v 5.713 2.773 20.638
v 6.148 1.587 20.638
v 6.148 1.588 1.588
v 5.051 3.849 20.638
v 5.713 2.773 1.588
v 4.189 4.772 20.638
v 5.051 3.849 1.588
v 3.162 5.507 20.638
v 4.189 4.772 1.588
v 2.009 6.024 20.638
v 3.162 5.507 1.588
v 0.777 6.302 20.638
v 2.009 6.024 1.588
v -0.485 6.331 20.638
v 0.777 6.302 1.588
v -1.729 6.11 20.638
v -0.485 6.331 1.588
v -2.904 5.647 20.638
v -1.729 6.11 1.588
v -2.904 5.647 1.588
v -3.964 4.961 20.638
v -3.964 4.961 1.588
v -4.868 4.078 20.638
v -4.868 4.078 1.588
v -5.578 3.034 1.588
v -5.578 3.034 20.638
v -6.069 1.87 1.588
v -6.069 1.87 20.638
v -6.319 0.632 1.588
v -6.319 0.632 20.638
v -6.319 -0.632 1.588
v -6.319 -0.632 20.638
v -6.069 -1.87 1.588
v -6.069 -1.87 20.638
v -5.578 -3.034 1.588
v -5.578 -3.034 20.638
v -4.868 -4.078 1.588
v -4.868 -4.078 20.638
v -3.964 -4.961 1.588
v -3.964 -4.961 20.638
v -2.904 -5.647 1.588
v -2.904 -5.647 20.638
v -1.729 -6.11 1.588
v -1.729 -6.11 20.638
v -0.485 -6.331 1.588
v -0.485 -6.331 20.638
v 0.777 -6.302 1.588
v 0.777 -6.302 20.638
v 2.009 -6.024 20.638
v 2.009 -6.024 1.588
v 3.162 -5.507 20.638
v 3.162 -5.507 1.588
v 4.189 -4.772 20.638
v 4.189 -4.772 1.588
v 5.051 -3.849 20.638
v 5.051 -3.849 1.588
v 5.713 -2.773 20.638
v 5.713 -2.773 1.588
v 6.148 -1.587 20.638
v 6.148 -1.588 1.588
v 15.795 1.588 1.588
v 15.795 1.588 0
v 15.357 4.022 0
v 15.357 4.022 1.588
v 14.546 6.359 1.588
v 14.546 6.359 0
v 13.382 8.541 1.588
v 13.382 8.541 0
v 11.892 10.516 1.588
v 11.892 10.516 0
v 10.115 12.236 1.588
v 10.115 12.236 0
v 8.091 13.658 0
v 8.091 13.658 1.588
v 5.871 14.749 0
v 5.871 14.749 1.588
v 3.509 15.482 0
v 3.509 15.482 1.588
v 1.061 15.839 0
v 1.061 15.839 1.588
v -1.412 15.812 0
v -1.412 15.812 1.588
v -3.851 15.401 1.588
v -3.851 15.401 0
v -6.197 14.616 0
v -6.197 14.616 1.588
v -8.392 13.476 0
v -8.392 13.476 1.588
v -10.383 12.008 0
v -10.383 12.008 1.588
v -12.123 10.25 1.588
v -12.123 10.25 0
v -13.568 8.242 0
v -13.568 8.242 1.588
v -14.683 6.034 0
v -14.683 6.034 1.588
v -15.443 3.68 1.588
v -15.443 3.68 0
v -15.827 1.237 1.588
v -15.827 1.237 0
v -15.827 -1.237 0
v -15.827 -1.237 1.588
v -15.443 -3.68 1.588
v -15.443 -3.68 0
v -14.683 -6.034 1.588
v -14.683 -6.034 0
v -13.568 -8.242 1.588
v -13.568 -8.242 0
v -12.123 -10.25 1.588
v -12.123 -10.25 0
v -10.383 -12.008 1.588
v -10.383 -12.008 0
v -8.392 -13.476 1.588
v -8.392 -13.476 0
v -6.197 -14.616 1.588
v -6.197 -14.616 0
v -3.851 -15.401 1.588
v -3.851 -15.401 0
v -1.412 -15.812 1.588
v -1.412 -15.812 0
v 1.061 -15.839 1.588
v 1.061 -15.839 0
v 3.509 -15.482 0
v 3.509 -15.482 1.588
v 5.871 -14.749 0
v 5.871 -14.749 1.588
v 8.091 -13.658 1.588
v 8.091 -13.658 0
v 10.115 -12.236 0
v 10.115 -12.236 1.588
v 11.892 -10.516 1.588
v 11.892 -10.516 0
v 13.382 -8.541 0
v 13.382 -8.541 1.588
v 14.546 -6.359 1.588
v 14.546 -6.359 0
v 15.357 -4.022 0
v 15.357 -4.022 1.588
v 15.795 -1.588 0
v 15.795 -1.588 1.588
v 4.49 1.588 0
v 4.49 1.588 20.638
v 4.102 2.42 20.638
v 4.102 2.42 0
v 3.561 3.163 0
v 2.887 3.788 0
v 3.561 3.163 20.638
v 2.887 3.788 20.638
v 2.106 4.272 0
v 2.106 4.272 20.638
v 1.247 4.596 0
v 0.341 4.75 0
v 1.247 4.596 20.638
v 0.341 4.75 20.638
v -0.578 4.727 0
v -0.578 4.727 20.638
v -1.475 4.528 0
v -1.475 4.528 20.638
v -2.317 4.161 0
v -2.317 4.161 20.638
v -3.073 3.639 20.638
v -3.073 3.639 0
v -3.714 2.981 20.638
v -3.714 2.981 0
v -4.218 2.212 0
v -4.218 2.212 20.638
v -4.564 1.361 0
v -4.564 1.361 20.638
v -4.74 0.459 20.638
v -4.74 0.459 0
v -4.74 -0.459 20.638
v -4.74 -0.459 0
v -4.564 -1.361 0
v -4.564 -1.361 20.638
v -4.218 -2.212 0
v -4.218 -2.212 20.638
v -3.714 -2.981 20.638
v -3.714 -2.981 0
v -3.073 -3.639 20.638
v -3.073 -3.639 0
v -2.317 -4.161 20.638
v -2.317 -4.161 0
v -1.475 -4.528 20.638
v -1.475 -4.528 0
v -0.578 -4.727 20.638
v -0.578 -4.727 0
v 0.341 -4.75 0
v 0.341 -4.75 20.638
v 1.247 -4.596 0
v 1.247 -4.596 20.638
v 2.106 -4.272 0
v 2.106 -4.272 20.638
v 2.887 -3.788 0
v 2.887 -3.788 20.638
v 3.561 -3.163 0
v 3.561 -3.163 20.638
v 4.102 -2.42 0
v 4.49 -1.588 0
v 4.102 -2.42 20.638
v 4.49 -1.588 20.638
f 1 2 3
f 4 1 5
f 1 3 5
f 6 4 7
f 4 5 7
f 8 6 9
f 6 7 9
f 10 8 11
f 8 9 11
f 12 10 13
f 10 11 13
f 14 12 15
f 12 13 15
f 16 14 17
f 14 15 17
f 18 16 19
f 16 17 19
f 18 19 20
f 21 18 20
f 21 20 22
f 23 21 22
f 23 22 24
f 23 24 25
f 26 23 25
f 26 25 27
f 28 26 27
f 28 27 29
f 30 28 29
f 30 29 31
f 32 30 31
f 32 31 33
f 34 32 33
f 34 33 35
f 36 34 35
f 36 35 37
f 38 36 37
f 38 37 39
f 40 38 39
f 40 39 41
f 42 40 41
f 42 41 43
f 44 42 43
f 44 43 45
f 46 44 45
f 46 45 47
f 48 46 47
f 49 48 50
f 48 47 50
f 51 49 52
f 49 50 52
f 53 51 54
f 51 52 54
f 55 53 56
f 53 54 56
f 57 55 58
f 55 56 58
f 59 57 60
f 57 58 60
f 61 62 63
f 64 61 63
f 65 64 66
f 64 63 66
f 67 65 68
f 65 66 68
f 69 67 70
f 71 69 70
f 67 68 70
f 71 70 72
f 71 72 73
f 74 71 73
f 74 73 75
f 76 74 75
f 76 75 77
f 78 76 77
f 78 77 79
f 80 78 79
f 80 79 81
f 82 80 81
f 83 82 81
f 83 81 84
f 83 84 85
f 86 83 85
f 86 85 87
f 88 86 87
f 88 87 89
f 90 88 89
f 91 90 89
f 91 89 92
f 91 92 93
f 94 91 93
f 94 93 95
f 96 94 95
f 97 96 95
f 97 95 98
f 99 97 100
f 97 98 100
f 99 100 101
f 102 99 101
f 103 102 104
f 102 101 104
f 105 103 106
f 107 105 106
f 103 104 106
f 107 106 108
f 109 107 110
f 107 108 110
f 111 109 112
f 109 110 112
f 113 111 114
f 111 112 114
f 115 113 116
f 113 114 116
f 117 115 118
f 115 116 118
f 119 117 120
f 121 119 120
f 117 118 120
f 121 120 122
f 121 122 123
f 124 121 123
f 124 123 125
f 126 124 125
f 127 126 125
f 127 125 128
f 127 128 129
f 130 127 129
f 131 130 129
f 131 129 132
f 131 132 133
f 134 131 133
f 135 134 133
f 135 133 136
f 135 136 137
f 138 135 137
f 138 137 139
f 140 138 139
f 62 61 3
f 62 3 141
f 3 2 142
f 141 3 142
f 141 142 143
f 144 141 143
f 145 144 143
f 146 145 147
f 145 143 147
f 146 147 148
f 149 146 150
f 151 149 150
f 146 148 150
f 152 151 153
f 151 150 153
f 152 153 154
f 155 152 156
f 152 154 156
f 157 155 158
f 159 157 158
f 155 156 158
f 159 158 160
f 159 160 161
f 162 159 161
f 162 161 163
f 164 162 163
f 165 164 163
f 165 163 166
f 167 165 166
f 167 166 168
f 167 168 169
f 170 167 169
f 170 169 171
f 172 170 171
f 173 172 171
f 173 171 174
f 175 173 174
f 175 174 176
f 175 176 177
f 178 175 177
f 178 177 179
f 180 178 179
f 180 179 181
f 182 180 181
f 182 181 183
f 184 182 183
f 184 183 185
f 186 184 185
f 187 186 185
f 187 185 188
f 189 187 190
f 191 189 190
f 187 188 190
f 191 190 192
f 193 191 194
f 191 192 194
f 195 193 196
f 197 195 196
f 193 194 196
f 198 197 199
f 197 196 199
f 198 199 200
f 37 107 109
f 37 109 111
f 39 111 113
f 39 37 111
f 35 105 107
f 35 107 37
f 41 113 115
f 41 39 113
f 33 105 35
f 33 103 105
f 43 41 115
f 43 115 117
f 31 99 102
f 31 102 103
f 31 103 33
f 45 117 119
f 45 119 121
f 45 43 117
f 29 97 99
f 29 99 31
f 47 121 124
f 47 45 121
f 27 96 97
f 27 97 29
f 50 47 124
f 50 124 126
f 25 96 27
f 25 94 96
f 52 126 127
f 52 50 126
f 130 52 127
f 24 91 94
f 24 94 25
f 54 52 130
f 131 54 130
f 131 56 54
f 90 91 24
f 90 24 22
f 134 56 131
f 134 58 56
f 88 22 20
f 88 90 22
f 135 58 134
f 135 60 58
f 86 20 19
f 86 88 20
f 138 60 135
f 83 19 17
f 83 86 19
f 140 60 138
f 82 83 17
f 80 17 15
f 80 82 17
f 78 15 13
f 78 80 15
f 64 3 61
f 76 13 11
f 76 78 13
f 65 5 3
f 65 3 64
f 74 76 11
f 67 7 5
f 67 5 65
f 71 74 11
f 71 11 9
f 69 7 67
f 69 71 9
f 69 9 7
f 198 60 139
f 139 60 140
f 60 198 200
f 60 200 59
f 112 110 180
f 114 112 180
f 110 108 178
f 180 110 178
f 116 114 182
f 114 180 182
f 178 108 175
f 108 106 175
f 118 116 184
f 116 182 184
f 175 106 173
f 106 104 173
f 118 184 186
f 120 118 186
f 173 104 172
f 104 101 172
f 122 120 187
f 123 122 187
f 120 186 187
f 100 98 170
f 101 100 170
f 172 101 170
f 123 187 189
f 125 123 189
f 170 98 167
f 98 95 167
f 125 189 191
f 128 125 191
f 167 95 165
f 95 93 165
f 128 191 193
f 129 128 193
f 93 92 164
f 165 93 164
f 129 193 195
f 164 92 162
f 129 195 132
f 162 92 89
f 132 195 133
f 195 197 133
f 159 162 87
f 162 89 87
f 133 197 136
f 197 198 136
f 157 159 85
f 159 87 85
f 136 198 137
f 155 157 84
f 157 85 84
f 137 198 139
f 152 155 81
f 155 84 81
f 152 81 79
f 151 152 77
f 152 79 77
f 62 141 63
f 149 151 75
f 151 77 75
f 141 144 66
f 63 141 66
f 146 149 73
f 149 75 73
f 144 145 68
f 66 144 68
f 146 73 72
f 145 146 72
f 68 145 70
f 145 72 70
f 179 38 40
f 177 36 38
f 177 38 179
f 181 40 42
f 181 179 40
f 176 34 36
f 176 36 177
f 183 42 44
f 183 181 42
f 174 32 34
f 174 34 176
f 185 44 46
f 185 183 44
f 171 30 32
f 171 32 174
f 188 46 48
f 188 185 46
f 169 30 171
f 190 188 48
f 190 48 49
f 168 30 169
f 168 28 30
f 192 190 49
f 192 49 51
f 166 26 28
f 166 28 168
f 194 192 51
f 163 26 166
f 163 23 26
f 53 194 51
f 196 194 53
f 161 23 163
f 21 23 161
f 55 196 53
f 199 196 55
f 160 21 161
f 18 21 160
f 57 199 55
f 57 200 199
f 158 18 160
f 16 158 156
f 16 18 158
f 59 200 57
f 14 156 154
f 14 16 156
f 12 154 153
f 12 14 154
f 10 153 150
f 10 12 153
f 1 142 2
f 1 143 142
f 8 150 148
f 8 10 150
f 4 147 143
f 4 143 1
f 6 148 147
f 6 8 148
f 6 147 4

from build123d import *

# Parameters (mm, degrees)
F0_R     = 15.875
F1_DEPTH = 1.5875
F2_R     = 6.35
F3_DEPTH = 19.05
F5_DEPTH = 20.6385


with BuildPart() as f1:
    # F0 (on Top) → F1 (new body)
    with BuildSketch(Plane.XY):
        Circle(F0_R)
    extrude(amount=F1_DEPTH)

    # F2 (on face) → F3 (join)
    with BuildSketch(Plane.XY.offset(1.5875)):
        Circle(F2_R)
    extrude(amount=F3_DEPTH)

    # F4 (on face) → F5 (cut, through all)
    with BuildSketch(Plane.XY.offset(20.6375)):
        with BuildLine():
            Line((15.795426, 1.5875), (4.490128, 1.5875))
            ThreePointArc((4.490128, 1.5875), (-4.7625, 0), (4.490128, -1.5875))
            Line((4.490128, -1.5875), (15.795426, -1.5875))
            ThreePointArc((15.795426, -1.5875), (15.875, 0), (15.795426, 1.5875))
        make_face()
    extrude(amount=-F5_DEPTH, mode=Mode.SUBTRACT)


solid = f1.part
